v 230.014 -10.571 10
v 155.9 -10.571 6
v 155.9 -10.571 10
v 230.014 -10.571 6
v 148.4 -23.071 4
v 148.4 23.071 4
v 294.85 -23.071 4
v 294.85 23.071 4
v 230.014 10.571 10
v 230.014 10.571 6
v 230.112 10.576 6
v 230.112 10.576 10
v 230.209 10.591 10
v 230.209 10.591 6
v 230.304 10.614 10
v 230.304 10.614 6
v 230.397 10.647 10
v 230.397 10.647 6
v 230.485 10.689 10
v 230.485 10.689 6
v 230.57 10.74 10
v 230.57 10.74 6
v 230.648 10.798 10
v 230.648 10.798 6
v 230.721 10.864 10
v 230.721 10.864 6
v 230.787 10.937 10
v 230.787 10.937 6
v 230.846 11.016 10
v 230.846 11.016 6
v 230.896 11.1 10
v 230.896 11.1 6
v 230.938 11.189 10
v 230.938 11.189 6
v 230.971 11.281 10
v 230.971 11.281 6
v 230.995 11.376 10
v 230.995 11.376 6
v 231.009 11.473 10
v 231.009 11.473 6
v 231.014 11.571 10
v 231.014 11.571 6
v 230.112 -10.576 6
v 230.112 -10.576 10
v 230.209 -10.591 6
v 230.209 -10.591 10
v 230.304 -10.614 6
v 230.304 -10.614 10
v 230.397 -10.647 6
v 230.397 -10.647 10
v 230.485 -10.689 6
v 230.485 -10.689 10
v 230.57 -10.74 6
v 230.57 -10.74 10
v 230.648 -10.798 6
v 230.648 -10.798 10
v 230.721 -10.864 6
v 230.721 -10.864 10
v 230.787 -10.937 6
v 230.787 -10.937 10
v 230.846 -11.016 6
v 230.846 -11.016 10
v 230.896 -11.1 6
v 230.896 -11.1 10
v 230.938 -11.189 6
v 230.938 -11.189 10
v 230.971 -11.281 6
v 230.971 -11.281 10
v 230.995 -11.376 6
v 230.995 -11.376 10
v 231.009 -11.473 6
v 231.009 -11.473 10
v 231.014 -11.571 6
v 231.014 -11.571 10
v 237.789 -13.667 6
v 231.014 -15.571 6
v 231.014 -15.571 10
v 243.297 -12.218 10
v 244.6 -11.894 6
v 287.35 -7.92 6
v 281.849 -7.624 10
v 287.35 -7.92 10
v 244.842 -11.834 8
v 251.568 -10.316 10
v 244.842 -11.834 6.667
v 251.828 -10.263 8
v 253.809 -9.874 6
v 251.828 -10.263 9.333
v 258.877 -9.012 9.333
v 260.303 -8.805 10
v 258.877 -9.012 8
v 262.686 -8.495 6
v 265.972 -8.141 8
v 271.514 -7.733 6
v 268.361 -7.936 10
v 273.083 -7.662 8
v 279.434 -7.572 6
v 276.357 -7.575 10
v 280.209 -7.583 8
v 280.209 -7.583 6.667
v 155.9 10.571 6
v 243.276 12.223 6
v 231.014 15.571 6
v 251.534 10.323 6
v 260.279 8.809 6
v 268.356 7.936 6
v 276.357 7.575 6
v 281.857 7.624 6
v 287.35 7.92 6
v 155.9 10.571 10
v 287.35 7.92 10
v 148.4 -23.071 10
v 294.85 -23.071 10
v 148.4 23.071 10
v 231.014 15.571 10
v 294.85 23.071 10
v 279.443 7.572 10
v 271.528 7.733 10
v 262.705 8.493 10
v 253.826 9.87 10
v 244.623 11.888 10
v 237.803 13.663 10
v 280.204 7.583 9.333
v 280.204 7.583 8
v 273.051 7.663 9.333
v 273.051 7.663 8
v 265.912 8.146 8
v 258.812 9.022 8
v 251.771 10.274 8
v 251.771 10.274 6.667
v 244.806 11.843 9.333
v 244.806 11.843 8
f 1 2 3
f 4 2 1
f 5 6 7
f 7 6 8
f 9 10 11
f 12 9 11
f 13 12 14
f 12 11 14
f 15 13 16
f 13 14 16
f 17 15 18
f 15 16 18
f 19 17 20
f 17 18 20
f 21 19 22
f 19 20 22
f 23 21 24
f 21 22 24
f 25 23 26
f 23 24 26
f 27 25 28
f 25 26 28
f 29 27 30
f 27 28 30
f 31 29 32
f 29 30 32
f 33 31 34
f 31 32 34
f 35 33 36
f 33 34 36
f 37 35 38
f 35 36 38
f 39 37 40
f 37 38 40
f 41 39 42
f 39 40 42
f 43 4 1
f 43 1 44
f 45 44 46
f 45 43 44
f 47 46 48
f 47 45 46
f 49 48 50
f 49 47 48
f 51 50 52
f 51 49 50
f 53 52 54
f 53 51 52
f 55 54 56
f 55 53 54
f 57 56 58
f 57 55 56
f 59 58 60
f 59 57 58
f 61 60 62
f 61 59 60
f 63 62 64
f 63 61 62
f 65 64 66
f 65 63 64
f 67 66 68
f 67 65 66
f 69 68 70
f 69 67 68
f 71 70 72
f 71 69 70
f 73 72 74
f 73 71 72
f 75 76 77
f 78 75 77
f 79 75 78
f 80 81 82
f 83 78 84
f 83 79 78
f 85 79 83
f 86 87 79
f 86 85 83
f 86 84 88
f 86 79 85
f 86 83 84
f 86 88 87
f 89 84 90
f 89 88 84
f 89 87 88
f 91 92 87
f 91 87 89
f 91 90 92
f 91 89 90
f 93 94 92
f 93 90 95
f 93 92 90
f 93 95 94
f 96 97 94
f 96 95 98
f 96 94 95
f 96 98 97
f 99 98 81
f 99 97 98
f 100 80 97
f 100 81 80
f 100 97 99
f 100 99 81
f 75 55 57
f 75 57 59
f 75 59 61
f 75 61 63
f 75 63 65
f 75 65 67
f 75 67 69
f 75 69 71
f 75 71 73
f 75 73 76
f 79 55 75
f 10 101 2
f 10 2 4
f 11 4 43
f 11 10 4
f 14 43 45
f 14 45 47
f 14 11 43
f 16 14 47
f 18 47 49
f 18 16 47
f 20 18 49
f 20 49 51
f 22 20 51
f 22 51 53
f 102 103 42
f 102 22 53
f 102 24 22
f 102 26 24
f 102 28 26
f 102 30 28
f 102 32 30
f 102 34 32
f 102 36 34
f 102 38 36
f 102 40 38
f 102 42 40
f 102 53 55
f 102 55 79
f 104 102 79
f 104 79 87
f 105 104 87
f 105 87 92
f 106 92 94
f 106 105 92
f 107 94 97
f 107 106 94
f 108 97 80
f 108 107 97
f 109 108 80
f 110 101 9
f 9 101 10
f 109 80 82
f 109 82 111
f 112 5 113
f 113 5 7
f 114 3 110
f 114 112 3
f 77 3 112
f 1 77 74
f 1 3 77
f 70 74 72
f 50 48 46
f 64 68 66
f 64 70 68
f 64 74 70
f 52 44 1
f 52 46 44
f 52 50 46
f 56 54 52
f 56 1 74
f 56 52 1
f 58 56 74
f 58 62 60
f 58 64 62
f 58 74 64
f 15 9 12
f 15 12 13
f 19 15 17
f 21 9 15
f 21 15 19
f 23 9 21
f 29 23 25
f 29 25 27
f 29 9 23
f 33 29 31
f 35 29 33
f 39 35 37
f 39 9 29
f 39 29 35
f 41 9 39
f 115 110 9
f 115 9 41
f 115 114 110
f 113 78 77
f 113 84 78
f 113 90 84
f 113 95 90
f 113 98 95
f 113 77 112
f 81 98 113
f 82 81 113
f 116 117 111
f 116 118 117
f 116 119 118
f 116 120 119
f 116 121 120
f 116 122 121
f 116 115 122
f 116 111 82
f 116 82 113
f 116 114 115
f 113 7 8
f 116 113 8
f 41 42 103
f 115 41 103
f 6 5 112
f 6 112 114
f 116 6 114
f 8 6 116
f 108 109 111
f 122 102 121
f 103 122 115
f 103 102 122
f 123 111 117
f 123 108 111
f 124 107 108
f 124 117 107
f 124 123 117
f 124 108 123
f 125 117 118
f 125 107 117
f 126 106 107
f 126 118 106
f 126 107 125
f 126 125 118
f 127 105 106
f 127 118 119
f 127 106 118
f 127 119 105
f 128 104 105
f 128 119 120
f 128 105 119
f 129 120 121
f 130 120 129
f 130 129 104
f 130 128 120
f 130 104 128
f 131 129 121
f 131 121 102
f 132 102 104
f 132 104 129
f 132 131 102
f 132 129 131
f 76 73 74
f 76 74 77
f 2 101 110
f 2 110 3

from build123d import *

# Parameters (mm, degrees)
SKETCH3_W           = 146.45
SKETCH3_H           = 46.142690012
BOSS_EXTRUDE1_DEPTH = 10
SKETCH5_W           = 146.45
SKETCH5_H           = 46.142690012
BOSS_EXTRUDE2_DEPTH = 6
BOSS_EXTRUDE3_DEPTH = 4


with BuildPart() as part:
    # Sketch3 → Boss-Extrude1 (new body)
    with BuildSketch(Plane.XY):
        with Locations((221.625, 0)):
            Rectangle(SKETCH3_W, SKETCH3_H)
        with BuildLine():
            Line((231.014073024, 15.571345006), (155.9, 15.571345006))
            Line((155.9, 15.571345006), (155.9, -15.571345006))
            Line((155.9, -15.571345006), (231.014073024, -15.571345006))
            add(Edge.make_bspline(
                [(231.014073024, -15.571345006), (235.603926114, -14.253380454), (240.202907461, -12.969220406), (247.161881801, -11.267037426), (249.489374332, -10.737991357), (254.165641768, -9.787213526), (256.514768348, -9.366822526), (263.601279745, -8.301427441), (268.338086531, -7.848826201), (275.456073059, -7.568289481), (277.831222276, -7.541362556), (282.586677642, -7.625574787), (284.967063297, -7.738842578), (287.35, -7.920409313)],
                knots=[0, 0, 0, 0, 0.25, 0.25, 0.375, 0.375, 0.5, 0.5, 0.75, 0.75, 0.875, 0.875, 1, 1, 1, 1], degree=3))
            Line((287.35, -7.920409313), (287.35, 7.920409313))
            add(Edge.make_bspline(
                [(287.35, 7.920409313), (284.969156465, 7.739002066), (282.587135429, 7.625484493), (277.820616166, 7.541273347), (275.436154733, 7.568458416), (268.279260355, 7.852389695), (263.532649453, 8.309357778), (256.45099394, 9.377629241), (254.104302816, 9.79880166), (249.438001237, 10.749341419), (247.117365, 11.277508342), (240.182218106, 12.975127096), (235.594114602, 14.256197804), (231.014073024, 15.571345006)],
                knots=[0, 0, 0, 0, 0.125, 0.125, 0.25, 0.25, 0.5, 0.5, 0.625, 0.625, 0.75, 0.75, 1, 1, 1, 1], degree=3))
        make_face(mode=Mode.SUBTRACT)
    extrude(amount=BOSS_EXTRUDE1_DEPTH)

    # Sketch5 → Boss-Extrude2 (add)
    with BuildSketch(Plane.XY):
        with Locations((221.625, 0)):
            Rectangle(SKETCH5_W, SKETCH5_H)
    extrude(amount=BOSS_EXTRUDE2_DEPTH)

    # Sketch6 → Boss-Extrude3 (add)
    with BuildSketch(Plane.XY.offset(6)):
        with BuildLine():
            Line((231.014073024, 15.571345006), (155.9, 15.571345006))
            Line((155.9, 15.571345006), (155.9, 10.571345006))
            Line((155.9, 10.571345006), (230.014073024, 10.571345006))
            ThreePointArc((230.014073024, 10.571345006), (230.721179805, 10.864238225), (231.014073024, 11.571345006))
            Line((231.014073024, 11.571345006), (231.014073024, 15.571345006))
        make_face()
        with BuildLine():
            Line((231.014073024, -15.571345006), (155.9, -15.571345006))
            Line((155.9, -15.571345006), (155.9, -10.571345006))
            Line((155.9, -10.571345006), (230.014073024, -10.571345006))
            ThreePointArc((230.014073024, -10.571345006), (230.721179805, -10.864238225), (231.014073024, -11.571345006))
            Line((231.014073024, -11.571345006), (231.014073024, -15.571345006))
        make_face()
    extrude(amount=BOSS_EXTRUDE3_DEPTH)

    # SurfaceCut2
    split(bisect_by=Plane.XY.offset(4), keep=Keep.TOP)


solid = part.part
